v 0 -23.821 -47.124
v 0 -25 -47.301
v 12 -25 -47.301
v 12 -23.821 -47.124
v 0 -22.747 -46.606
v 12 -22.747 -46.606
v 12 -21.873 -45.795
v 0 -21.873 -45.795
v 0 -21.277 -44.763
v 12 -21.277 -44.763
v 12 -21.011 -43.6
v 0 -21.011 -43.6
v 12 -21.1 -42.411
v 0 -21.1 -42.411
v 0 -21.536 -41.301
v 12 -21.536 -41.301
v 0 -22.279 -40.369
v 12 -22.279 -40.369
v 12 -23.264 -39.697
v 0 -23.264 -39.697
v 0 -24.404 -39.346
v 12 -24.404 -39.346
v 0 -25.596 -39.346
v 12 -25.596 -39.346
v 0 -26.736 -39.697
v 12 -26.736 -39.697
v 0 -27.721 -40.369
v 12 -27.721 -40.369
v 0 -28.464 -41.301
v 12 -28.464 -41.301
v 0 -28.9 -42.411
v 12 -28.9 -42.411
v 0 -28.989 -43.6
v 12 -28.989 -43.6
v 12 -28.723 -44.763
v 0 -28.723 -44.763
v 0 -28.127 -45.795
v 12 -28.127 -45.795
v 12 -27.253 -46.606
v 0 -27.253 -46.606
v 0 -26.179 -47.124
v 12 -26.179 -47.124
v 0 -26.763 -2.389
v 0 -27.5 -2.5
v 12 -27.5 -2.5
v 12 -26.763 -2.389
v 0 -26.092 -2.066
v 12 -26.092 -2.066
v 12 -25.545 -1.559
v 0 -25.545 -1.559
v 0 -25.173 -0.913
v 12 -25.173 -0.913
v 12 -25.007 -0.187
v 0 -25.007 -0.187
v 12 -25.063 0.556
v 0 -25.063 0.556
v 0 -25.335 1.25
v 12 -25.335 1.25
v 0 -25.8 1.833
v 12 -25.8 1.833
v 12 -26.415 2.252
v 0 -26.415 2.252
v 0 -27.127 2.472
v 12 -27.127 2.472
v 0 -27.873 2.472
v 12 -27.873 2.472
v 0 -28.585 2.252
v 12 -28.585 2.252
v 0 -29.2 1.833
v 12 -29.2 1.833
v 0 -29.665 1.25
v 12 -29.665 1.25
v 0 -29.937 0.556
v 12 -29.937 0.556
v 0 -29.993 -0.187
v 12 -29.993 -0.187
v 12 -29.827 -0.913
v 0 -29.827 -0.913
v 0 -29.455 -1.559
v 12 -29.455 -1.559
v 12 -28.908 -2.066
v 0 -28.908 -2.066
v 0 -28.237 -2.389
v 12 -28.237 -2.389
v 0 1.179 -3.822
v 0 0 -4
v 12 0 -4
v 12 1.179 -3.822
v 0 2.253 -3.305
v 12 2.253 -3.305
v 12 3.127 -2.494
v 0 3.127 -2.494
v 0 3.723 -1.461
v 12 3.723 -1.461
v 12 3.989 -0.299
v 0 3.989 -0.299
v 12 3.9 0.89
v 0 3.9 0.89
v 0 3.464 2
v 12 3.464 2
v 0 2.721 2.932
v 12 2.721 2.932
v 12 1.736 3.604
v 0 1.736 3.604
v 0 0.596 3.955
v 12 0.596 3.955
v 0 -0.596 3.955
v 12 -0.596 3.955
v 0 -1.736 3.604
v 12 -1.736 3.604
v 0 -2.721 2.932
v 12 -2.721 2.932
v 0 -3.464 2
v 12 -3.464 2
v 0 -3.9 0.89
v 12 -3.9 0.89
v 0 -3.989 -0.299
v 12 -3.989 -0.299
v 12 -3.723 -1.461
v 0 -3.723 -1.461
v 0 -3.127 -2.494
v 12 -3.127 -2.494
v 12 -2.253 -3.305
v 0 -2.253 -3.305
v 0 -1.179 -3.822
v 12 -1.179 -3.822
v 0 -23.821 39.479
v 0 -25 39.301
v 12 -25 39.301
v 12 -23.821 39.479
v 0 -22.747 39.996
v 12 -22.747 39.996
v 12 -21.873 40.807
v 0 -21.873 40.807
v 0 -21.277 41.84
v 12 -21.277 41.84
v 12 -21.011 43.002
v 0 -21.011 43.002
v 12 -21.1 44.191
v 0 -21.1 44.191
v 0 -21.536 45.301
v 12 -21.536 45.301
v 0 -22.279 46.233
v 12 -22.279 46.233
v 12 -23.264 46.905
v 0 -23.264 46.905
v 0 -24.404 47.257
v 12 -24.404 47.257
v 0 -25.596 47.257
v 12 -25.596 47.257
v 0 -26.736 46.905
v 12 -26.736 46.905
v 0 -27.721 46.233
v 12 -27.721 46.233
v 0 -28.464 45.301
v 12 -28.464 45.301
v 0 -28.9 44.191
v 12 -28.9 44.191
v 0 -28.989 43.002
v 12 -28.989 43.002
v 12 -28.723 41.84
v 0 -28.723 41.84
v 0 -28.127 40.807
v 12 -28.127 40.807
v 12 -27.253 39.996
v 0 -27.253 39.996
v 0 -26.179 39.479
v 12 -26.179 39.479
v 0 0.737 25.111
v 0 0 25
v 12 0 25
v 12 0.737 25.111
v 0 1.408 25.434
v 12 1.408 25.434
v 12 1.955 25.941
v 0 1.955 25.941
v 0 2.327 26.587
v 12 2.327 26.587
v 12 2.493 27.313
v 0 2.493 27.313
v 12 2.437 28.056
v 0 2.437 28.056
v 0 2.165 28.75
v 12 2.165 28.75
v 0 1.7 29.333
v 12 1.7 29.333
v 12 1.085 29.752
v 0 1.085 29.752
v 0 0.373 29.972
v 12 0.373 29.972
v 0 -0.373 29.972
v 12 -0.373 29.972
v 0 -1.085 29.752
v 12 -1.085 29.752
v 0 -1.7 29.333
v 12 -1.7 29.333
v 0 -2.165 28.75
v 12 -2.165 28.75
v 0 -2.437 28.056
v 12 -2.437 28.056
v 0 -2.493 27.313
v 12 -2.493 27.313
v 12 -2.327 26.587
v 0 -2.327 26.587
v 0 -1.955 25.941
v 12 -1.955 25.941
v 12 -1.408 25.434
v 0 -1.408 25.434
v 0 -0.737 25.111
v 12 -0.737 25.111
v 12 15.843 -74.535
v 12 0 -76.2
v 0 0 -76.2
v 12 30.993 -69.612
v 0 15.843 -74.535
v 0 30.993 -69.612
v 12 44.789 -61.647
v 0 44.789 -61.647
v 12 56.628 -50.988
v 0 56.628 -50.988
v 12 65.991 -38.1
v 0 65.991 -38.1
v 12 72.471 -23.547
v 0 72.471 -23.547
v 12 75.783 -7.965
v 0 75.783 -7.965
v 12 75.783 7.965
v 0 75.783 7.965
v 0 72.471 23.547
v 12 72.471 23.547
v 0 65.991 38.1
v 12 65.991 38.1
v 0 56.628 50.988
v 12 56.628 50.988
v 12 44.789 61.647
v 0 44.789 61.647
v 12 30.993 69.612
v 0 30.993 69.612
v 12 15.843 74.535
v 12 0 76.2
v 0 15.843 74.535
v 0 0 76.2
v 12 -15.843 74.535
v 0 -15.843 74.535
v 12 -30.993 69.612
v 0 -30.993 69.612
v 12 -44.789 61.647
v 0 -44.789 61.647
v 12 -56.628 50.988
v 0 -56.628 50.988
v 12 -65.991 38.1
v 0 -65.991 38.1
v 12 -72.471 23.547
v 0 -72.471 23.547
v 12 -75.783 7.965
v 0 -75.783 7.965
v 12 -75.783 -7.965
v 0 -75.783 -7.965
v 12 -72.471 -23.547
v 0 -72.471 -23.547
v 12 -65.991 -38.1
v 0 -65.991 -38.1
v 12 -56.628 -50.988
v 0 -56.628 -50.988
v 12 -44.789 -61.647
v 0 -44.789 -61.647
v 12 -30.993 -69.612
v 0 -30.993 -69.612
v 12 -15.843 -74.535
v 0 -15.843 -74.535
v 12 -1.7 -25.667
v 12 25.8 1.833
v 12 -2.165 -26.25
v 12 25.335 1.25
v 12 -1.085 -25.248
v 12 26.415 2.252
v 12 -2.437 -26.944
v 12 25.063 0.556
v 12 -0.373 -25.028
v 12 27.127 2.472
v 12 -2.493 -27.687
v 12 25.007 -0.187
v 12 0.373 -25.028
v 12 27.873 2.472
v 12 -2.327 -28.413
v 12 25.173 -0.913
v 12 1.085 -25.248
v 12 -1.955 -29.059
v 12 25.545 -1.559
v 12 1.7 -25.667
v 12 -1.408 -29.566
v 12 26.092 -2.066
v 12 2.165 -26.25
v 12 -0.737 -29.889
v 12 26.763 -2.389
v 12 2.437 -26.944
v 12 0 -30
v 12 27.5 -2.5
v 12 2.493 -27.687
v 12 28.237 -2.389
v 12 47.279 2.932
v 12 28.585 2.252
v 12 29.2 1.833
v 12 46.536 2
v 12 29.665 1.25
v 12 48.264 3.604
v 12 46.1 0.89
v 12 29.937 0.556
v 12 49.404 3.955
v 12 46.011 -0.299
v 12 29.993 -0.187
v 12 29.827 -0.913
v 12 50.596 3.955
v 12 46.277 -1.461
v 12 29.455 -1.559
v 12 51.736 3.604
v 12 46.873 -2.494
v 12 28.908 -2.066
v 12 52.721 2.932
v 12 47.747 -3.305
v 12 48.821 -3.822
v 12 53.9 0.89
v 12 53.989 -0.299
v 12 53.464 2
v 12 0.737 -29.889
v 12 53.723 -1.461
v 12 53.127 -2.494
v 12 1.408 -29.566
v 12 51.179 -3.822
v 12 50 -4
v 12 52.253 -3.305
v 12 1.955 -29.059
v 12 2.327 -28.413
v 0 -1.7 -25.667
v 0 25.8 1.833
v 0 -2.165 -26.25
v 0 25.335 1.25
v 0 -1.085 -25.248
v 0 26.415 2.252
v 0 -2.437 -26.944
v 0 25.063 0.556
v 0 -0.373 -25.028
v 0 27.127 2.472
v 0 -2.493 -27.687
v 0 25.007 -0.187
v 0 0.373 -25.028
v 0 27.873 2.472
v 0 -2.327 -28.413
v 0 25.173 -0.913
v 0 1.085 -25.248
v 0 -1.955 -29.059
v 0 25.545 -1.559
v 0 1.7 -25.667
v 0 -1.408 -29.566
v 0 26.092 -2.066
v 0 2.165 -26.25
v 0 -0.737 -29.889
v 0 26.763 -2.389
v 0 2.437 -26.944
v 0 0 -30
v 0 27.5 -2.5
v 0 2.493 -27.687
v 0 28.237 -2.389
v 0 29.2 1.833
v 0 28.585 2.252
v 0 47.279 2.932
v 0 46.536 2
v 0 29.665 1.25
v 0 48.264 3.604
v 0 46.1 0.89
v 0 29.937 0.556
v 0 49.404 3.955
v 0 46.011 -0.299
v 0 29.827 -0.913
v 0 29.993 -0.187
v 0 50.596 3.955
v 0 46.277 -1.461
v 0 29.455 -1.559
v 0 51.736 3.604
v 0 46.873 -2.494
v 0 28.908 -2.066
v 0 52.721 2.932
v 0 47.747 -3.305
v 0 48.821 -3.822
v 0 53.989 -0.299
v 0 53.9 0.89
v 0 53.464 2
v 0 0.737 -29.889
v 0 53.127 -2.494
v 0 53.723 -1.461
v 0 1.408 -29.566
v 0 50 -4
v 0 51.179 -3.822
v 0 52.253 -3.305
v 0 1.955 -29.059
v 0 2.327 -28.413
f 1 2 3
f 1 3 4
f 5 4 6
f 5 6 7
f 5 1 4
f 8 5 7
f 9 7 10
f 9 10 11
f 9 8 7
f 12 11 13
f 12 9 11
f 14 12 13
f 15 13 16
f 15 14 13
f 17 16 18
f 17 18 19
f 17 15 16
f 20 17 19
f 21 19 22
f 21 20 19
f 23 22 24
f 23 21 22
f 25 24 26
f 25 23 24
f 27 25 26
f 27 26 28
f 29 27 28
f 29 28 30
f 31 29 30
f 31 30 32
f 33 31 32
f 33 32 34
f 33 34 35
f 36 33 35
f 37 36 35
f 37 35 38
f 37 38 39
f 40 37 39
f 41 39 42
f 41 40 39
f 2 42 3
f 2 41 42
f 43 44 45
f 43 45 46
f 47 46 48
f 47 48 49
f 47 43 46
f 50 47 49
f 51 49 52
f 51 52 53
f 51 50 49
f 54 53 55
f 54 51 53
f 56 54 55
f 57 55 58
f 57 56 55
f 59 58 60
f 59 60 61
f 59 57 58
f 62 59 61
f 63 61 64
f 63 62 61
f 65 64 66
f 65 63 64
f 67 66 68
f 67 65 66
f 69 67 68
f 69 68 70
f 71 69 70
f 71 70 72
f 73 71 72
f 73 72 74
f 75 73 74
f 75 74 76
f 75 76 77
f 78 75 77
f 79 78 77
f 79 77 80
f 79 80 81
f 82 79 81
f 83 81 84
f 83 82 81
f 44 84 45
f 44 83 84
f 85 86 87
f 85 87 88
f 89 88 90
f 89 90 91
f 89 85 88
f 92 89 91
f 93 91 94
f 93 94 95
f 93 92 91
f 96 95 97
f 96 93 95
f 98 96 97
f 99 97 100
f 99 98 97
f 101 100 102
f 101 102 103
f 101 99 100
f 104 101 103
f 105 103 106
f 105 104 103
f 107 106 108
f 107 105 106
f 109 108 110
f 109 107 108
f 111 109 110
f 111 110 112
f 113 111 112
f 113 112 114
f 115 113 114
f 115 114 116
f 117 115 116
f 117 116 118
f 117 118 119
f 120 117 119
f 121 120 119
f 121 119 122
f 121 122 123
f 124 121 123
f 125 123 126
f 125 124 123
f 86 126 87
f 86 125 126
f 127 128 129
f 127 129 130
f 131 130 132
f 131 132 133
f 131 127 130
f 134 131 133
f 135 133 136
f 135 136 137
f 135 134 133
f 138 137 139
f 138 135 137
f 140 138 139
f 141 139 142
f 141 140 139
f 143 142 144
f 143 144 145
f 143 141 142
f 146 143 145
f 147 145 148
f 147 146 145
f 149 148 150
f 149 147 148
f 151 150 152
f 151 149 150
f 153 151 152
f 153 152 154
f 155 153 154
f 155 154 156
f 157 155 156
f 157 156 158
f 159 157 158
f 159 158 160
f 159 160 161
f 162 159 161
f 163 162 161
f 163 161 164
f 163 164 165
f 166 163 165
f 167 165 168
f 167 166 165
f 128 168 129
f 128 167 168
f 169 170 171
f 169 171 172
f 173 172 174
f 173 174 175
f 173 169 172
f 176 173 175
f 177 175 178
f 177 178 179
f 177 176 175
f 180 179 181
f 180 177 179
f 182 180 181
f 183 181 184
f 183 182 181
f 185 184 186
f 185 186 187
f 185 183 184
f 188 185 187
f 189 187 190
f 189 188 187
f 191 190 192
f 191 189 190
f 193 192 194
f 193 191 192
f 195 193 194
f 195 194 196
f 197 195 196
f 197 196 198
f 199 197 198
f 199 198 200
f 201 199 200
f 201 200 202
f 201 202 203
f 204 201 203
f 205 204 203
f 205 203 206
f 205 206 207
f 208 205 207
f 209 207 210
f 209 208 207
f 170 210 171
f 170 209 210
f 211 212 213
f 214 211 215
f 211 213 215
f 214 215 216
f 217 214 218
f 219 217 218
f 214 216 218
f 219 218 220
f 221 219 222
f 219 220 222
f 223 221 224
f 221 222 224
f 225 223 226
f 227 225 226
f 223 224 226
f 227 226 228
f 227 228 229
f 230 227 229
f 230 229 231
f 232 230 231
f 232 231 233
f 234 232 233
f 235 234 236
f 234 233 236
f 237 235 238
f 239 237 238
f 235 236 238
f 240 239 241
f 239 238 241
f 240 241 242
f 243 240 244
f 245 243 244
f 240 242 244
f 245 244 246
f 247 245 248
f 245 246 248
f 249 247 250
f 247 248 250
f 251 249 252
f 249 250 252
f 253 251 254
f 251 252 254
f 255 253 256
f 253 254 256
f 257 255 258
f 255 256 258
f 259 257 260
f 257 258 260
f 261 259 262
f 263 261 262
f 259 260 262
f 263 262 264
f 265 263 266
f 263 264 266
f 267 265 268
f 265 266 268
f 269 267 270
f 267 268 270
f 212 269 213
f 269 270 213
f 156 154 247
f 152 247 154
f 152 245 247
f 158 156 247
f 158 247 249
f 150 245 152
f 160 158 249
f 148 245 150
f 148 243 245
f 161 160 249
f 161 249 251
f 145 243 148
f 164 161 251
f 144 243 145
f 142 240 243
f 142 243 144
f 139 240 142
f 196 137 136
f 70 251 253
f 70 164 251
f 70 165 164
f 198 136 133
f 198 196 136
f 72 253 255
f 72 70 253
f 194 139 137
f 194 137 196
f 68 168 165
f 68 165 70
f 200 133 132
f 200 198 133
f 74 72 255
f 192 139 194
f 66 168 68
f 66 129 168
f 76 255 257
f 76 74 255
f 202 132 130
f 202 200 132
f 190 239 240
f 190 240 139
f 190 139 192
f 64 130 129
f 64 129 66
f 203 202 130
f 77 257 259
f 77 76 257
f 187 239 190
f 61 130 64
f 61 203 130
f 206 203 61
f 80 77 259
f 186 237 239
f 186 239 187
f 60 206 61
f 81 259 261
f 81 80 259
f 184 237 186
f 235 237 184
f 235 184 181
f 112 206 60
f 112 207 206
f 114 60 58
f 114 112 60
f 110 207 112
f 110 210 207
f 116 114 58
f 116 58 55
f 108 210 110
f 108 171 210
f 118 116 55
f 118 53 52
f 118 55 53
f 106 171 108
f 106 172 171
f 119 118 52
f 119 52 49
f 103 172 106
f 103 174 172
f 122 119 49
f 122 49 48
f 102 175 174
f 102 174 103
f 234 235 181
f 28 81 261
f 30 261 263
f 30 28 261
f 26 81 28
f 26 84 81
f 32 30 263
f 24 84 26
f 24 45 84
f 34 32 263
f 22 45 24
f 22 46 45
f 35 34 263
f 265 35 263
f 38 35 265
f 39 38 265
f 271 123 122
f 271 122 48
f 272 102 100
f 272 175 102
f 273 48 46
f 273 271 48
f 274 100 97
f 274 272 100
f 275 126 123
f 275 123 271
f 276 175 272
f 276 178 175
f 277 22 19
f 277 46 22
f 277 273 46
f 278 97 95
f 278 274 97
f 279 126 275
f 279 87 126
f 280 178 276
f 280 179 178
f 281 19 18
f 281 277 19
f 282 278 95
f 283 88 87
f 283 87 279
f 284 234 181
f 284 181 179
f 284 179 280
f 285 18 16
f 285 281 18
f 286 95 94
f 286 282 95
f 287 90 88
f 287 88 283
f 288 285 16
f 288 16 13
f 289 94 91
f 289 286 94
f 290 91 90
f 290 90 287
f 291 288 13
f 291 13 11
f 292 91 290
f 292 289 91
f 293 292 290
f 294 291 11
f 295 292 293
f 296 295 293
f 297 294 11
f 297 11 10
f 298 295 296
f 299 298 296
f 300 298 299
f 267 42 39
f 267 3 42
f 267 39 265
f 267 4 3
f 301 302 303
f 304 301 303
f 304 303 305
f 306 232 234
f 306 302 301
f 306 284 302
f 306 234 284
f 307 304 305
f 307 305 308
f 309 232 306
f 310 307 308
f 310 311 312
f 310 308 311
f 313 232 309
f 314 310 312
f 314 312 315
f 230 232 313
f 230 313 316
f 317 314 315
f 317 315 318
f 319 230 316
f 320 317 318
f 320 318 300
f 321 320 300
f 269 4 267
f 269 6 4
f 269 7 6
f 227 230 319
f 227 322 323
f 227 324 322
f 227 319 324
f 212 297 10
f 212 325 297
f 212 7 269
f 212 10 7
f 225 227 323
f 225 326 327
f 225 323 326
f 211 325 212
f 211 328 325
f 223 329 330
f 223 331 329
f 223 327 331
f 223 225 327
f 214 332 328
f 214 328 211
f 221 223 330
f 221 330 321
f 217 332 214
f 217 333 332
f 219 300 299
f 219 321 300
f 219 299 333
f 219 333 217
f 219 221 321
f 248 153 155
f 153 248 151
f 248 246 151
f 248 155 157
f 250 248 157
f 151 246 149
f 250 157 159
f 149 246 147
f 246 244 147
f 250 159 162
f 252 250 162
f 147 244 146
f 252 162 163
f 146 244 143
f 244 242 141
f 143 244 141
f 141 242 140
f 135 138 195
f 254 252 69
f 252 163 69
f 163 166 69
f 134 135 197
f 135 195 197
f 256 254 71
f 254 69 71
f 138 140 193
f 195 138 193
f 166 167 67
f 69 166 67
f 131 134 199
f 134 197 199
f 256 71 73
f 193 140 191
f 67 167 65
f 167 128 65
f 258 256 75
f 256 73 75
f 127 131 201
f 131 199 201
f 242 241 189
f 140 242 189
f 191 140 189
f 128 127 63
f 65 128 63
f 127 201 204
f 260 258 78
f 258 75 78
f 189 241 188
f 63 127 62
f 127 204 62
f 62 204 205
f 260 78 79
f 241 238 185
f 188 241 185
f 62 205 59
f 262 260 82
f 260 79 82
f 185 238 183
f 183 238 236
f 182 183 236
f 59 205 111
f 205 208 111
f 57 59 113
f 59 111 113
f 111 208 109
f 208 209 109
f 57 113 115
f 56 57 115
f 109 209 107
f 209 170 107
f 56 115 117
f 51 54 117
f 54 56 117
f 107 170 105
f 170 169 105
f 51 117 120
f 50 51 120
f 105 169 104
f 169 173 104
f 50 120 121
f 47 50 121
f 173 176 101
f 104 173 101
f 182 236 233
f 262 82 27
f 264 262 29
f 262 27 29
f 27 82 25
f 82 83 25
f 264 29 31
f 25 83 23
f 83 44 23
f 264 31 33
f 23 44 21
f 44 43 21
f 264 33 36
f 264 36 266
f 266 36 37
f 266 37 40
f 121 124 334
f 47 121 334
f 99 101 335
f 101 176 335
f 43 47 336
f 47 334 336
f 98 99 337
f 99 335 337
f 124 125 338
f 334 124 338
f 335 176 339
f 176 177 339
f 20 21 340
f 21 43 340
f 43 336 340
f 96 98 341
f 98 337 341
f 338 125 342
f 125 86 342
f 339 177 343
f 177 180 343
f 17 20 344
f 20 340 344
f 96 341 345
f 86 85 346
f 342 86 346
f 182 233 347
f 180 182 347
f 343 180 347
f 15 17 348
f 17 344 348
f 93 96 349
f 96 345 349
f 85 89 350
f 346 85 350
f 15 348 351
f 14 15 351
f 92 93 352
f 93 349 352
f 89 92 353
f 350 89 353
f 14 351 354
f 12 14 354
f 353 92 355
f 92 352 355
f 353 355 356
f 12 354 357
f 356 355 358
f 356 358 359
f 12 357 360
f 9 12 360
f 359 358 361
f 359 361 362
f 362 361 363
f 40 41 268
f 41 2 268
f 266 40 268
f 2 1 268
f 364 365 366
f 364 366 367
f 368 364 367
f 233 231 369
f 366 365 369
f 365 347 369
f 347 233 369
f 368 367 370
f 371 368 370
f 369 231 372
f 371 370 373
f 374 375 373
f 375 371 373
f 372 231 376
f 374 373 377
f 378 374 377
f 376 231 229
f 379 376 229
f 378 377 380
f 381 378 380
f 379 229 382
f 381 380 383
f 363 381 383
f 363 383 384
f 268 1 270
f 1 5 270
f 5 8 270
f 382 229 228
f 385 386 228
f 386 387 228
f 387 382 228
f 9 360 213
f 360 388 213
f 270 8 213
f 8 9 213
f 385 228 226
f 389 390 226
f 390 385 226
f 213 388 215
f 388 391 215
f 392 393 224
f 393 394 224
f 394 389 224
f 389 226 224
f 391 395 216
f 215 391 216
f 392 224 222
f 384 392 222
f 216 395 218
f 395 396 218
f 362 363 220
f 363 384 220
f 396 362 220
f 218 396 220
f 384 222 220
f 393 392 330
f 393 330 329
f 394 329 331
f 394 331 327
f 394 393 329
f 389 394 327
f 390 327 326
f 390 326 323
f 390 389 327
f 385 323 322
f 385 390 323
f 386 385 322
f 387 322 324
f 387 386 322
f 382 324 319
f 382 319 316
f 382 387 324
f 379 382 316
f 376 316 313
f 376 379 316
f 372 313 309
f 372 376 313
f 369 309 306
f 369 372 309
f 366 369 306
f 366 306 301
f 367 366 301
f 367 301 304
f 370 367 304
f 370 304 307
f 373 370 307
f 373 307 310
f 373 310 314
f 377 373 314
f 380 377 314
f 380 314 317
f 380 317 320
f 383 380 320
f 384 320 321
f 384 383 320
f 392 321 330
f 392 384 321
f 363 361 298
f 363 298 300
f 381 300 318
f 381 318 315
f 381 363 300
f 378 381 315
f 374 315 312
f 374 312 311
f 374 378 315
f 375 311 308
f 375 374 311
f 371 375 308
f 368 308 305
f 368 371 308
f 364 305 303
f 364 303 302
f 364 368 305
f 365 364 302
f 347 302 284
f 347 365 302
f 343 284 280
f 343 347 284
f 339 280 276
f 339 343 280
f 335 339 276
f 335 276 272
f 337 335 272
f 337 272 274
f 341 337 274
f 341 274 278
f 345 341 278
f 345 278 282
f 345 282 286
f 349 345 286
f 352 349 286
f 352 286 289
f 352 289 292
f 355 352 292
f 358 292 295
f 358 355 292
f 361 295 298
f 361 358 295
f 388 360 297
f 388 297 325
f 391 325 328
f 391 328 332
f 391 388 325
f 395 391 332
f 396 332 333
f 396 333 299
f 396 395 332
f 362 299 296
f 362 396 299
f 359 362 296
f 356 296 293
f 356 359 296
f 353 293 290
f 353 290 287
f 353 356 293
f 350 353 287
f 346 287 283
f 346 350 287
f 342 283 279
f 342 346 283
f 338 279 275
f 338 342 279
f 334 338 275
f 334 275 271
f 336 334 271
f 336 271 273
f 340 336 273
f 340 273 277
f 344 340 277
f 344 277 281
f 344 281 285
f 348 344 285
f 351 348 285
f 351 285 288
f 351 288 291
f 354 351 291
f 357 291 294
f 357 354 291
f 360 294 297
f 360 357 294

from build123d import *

# Parameters (mm, degrees)
SKETCH2_R           = 76.2
SKETCH2_R_2         = 2.5
SKETCH2_R_3         = 4
BOSS_EXTRUDE1_DEPTH = 12


with BuildPart() as part:
    # Sketch2 → Boss-Extrude1 (new body)
    with BuildSketch(Plane(origin=(0, 0, 0), x_dir=(0, 0, -1), z_dir=(1, 0, 0))):
        Circle(SKETCH2_R)
        with Locations((0, 27.5)):
            Circle(SKETCH2_R_2, mode=Mode.SUBTRACT)
        with Locations((27.5, 0)):
            Circle(SKETCH2_R_2, mode=Mode.SUBTRACT)
        with Locations((0, -27.5)):
            Circle(SKETCH2_R_2, mode=Mode.SUBTRACT)
        with Locations((-27.5, 0)):
            Circle(SKETCH2_R_2, mode=Mode.SUBTRACT)
        with Locations((0, 50)):
            Circle(SKETCH2_R_3, mode=Mode.SUBTRACT)
        with Locations((43.301270189, -25)):
            Circle(SKETCH2_R_3, mode=Mode.SUBTRACT)
        with Locations((-43.301270189, -25)):
            Circle(SKETCH2_R_3, mode=Mode.SUBTRACT)
        Circle(SKETCH2_R_3, mode=Mode.SUBTRACT)
    extrude(amount=BOSS_EXTRUDE1_DEPTH)


solid = part.part
